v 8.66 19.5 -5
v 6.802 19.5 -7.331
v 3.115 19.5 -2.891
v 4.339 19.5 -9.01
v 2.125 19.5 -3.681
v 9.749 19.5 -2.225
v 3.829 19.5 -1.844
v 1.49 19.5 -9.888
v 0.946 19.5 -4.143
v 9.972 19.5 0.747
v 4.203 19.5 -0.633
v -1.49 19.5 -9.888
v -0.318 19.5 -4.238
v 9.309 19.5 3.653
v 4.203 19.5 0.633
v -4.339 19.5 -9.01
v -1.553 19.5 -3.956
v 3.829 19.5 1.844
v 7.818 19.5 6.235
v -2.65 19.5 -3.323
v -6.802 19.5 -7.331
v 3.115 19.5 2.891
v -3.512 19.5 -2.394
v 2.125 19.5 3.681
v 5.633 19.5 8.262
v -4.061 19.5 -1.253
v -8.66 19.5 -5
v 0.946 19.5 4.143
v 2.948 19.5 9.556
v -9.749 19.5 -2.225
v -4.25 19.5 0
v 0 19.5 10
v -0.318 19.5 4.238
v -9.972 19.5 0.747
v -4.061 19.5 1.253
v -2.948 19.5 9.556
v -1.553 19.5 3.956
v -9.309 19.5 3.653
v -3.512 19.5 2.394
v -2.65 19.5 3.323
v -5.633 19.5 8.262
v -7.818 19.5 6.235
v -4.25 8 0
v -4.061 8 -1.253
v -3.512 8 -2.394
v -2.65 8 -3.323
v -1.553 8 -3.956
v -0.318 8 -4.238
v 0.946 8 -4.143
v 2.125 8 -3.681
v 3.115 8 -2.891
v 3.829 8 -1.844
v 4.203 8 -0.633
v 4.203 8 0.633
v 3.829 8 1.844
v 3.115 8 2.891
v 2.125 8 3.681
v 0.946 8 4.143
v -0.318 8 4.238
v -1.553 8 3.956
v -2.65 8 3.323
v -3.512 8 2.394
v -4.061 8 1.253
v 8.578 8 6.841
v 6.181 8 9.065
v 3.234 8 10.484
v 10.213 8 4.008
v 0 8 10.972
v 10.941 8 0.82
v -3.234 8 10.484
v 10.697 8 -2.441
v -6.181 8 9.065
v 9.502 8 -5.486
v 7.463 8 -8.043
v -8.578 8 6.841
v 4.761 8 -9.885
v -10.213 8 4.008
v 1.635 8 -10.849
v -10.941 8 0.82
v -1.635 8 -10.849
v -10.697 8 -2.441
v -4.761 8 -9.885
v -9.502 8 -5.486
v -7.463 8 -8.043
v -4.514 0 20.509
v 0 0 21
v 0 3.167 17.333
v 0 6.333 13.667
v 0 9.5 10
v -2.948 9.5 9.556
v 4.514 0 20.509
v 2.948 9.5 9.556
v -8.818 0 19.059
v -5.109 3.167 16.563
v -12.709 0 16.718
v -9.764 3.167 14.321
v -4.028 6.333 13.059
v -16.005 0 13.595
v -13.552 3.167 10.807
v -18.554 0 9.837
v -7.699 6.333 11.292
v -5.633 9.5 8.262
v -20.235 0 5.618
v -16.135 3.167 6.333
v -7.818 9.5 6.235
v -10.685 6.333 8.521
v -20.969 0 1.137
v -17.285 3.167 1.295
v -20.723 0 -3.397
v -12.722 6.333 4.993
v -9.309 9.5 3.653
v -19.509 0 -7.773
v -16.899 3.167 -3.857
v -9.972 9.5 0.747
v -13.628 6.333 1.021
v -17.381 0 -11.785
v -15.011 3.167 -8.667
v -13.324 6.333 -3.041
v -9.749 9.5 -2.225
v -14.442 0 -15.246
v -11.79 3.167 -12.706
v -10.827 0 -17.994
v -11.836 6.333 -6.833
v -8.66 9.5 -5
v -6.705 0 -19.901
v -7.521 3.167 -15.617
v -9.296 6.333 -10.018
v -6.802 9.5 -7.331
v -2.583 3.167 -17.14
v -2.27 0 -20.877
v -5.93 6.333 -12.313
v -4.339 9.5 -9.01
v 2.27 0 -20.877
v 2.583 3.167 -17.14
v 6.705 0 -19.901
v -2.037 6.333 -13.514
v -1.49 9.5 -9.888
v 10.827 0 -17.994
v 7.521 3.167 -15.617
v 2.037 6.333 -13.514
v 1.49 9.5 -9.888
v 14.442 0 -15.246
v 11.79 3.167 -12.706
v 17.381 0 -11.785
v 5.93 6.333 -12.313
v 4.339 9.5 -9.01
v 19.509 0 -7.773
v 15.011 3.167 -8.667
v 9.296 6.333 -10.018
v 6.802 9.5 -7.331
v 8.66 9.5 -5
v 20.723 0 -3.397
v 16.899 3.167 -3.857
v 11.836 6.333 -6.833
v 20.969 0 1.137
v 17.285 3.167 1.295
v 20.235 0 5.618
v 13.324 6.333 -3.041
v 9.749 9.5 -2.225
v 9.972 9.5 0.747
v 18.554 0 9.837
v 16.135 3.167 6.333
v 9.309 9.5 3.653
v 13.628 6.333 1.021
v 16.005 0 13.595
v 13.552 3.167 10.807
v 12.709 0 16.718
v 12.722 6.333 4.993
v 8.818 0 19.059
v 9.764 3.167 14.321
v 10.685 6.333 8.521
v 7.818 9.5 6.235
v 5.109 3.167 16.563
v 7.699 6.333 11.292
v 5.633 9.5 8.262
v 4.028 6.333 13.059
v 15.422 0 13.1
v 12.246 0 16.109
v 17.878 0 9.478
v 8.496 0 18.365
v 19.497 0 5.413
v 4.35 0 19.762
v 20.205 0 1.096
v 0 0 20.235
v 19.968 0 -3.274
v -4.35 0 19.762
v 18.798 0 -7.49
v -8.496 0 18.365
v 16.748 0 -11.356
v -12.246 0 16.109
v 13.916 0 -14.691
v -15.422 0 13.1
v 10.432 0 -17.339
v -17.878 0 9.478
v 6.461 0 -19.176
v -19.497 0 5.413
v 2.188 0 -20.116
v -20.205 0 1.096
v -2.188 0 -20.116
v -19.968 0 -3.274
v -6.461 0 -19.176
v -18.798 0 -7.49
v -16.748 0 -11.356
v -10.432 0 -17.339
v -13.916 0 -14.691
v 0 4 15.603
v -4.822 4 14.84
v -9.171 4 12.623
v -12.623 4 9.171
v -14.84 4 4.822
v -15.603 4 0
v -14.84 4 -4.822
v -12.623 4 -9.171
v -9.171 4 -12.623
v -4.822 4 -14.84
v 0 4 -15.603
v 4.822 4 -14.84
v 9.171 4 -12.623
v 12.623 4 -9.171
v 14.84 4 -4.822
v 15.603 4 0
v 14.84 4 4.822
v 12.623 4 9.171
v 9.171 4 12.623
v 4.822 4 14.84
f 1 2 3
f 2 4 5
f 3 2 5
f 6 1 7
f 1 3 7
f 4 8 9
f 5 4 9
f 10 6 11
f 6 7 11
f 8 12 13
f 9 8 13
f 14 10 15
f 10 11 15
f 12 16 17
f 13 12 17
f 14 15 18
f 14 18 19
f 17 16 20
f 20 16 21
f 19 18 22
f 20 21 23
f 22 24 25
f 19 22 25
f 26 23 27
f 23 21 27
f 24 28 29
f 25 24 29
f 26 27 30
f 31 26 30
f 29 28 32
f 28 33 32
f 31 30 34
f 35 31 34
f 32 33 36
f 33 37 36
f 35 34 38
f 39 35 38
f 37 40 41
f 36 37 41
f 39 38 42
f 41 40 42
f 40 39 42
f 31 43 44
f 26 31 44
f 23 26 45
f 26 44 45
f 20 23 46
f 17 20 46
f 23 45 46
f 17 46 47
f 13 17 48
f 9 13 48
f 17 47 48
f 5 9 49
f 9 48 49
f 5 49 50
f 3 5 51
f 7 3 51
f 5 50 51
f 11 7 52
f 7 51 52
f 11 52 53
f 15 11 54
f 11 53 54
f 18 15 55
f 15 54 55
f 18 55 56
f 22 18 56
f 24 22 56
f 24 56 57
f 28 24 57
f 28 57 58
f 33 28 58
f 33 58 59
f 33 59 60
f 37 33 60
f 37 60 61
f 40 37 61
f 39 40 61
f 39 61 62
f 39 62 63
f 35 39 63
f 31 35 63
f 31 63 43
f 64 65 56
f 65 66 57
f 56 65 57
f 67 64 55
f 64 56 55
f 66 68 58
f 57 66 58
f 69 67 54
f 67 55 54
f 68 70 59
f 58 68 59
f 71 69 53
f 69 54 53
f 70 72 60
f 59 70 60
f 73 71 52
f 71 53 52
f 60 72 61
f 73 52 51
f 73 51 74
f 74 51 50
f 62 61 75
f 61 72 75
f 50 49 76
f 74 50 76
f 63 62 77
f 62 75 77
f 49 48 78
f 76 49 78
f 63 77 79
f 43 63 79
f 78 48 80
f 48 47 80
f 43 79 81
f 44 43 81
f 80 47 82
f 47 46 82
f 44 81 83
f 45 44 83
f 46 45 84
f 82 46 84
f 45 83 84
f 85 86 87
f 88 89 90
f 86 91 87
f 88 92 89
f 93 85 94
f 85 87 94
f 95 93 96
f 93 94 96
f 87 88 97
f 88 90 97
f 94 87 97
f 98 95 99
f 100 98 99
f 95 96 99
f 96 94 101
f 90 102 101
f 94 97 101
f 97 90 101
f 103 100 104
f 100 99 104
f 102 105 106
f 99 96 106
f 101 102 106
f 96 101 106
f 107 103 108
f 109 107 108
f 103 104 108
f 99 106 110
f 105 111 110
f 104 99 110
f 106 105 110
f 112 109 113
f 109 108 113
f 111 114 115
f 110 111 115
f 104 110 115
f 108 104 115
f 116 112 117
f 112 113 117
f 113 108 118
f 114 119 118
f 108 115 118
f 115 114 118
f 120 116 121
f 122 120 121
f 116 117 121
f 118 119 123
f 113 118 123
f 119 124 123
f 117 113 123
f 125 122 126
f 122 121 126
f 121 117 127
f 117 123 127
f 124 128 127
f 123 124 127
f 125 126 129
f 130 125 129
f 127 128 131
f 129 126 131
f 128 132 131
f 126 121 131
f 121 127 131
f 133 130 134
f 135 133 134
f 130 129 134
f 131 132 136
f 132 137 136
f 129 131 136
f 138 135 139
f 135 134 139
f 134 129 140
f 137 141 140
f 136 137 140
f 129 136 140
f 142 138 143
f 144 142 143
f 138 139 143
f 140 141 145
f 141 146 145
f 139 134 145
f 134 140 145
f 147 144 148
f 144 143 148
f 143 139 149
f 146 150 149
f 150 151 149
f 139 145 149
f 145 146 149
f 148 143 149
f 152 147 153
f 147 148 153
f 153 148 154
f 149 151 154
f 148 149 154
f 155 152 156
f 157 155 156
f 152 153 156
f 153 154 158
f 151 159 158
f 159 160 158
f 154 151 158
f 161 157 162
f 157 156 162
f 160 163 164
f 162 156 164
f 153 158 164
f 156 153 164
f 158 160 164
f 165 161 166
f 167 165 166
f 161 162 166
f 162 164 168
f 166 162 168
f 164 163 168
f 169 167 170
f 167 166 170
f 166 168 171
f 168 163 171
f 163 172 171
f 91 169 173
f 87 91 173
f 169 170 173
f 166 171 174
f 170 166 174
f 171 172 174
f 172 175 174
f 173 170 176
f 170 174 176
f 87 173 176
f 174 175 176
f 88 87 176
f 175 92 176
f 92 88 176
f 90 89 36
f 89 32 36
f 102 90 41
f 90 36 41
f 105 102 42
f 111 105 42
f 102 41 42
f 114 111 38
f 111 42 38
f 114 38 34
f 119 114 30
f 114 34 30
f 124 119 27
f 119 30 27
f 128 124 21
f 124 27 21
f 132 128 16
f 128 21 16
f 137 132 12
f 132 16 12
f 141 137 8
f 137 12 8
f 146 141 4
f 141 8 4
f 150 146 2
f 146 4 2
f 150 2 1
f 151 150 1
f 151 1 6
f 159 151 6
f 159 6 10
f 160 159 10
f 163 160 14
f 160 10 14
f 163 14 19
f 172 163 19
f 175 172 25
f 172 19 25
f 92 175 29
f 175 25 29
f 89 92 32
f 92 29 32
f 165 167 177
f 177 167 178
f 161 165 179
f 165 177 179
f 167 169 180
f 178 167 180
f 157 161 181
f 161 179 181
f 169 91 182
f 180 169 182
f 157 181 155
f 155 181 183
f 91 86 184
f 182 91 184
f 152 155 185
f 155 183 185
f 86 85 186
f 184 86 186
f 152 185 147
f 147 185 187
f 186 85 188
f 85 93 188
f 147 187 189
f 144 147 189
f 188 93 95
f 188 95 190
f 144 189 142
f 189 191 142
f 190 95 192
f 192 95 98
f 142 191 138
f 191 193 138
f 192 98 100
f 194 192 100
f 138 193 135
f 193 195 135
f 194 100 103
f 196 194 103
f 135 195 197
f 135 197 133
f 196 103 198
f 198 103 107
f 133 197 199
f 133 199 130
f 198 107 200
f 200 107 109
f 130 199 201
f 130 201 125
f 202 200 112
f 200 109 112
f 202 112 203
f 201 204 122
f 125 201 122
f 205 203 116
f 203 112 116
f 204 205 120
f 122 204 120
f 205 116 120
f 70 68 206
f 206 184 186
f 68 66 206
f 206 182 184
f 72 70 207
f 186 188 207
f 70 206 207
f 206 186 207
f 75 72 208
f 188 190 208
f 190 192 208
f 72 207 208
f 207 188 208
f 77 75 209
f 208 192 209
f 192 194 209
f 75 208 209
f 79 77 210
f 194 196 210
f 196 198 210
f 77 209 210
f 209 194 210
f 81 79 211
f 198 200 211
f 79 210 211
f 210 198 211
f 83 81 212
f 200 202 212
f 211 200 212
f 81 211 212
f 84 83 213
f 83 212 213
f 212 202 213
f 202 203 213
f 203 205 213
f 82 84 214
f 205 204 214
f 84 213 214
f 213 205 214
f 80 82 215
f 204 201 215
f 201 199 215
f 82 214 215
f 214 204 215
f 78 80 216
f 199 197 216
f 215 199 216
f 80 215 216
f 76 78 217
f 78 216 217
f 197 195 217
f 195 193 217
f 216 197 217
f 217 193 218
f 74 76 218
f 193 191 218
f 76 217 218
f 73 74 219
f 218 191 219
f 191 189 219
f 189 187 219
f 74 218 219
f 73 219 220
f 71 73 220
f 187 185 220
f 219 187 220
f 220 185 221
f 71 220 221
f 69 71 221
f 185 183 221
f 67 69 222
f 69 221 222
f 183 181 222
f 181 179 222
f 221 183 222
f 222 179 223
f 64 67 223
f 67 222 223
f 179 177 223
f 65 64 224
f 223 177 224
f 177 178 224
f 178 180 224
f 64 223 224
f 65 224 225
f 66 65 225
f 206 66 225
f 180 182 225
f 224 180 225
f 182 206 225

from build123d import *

# Parameters (mm, degrees)
M10_TAPPED_HOLE1_D     = 8.5
M10_TAPPED_HOLE1_DEPTH = 24.5
M10_TAPPED_HOLE1_TIP   = 2.553657631


with BuildPart() as part:
    # Sketch1 → Revolve1 (revolve)
    with BuildSketch(Plane.XY, mode=Mode.PRIVATE) as revolve1_sk:
        Polygon((0, 0), (21, 0), (10, 9.5), (10, 19.5), (0, 19.5), align=None)
    revolve(revolve1_sk.sketch.rotate(Axis((0, 59.431666947, 0), (0, -1, 0)), 90), axis=Axis((0, 59.431666947, 0), (0, -1, 0)))

    # Sketch2 → Cut-Revolve1 (revolve, cut)
    with BuildSketch(Plane.XY, mode=Mode.PRIVATE) as cut_revolve1_sk:
        Polygon((0, 8), (10.971871481, 8), (20.235029376, 0), (0, 0), align=None)
    revolve(cut_revolve1_sk.sketch.rotate(Axis((0, 26.152643853, 0), (0, -1, 0)), 90), axis=Axis((0, 26.152643853, 0), (0, -1, 0)), mode=Mode.SUBTRACT)

    # M10 Tapped Hole1
    with Locations(Plane(origin=(0, 19.5, 0), x_dir=(1, 0, 0), z_dir=(0, 1, 0))):
        with Locations((0, 0)):
            Hole(M10_TAPPED_HOLE1_D / 2, depth=M10_TAPPED_HOLE1_DEPTH)
            with Locations((0, 0, -(M10_TAPPED_HOLE1_DEPTH + M10_TAPPED_HOLE1_TIP / 2))):  # 118° drill point
                Cone(0, M10_TAPPED_HOLE1_D / 2, M10_TAPPED_HOLE1_TIP, mode=Mode.SUBTRACT)


solid = part.part
